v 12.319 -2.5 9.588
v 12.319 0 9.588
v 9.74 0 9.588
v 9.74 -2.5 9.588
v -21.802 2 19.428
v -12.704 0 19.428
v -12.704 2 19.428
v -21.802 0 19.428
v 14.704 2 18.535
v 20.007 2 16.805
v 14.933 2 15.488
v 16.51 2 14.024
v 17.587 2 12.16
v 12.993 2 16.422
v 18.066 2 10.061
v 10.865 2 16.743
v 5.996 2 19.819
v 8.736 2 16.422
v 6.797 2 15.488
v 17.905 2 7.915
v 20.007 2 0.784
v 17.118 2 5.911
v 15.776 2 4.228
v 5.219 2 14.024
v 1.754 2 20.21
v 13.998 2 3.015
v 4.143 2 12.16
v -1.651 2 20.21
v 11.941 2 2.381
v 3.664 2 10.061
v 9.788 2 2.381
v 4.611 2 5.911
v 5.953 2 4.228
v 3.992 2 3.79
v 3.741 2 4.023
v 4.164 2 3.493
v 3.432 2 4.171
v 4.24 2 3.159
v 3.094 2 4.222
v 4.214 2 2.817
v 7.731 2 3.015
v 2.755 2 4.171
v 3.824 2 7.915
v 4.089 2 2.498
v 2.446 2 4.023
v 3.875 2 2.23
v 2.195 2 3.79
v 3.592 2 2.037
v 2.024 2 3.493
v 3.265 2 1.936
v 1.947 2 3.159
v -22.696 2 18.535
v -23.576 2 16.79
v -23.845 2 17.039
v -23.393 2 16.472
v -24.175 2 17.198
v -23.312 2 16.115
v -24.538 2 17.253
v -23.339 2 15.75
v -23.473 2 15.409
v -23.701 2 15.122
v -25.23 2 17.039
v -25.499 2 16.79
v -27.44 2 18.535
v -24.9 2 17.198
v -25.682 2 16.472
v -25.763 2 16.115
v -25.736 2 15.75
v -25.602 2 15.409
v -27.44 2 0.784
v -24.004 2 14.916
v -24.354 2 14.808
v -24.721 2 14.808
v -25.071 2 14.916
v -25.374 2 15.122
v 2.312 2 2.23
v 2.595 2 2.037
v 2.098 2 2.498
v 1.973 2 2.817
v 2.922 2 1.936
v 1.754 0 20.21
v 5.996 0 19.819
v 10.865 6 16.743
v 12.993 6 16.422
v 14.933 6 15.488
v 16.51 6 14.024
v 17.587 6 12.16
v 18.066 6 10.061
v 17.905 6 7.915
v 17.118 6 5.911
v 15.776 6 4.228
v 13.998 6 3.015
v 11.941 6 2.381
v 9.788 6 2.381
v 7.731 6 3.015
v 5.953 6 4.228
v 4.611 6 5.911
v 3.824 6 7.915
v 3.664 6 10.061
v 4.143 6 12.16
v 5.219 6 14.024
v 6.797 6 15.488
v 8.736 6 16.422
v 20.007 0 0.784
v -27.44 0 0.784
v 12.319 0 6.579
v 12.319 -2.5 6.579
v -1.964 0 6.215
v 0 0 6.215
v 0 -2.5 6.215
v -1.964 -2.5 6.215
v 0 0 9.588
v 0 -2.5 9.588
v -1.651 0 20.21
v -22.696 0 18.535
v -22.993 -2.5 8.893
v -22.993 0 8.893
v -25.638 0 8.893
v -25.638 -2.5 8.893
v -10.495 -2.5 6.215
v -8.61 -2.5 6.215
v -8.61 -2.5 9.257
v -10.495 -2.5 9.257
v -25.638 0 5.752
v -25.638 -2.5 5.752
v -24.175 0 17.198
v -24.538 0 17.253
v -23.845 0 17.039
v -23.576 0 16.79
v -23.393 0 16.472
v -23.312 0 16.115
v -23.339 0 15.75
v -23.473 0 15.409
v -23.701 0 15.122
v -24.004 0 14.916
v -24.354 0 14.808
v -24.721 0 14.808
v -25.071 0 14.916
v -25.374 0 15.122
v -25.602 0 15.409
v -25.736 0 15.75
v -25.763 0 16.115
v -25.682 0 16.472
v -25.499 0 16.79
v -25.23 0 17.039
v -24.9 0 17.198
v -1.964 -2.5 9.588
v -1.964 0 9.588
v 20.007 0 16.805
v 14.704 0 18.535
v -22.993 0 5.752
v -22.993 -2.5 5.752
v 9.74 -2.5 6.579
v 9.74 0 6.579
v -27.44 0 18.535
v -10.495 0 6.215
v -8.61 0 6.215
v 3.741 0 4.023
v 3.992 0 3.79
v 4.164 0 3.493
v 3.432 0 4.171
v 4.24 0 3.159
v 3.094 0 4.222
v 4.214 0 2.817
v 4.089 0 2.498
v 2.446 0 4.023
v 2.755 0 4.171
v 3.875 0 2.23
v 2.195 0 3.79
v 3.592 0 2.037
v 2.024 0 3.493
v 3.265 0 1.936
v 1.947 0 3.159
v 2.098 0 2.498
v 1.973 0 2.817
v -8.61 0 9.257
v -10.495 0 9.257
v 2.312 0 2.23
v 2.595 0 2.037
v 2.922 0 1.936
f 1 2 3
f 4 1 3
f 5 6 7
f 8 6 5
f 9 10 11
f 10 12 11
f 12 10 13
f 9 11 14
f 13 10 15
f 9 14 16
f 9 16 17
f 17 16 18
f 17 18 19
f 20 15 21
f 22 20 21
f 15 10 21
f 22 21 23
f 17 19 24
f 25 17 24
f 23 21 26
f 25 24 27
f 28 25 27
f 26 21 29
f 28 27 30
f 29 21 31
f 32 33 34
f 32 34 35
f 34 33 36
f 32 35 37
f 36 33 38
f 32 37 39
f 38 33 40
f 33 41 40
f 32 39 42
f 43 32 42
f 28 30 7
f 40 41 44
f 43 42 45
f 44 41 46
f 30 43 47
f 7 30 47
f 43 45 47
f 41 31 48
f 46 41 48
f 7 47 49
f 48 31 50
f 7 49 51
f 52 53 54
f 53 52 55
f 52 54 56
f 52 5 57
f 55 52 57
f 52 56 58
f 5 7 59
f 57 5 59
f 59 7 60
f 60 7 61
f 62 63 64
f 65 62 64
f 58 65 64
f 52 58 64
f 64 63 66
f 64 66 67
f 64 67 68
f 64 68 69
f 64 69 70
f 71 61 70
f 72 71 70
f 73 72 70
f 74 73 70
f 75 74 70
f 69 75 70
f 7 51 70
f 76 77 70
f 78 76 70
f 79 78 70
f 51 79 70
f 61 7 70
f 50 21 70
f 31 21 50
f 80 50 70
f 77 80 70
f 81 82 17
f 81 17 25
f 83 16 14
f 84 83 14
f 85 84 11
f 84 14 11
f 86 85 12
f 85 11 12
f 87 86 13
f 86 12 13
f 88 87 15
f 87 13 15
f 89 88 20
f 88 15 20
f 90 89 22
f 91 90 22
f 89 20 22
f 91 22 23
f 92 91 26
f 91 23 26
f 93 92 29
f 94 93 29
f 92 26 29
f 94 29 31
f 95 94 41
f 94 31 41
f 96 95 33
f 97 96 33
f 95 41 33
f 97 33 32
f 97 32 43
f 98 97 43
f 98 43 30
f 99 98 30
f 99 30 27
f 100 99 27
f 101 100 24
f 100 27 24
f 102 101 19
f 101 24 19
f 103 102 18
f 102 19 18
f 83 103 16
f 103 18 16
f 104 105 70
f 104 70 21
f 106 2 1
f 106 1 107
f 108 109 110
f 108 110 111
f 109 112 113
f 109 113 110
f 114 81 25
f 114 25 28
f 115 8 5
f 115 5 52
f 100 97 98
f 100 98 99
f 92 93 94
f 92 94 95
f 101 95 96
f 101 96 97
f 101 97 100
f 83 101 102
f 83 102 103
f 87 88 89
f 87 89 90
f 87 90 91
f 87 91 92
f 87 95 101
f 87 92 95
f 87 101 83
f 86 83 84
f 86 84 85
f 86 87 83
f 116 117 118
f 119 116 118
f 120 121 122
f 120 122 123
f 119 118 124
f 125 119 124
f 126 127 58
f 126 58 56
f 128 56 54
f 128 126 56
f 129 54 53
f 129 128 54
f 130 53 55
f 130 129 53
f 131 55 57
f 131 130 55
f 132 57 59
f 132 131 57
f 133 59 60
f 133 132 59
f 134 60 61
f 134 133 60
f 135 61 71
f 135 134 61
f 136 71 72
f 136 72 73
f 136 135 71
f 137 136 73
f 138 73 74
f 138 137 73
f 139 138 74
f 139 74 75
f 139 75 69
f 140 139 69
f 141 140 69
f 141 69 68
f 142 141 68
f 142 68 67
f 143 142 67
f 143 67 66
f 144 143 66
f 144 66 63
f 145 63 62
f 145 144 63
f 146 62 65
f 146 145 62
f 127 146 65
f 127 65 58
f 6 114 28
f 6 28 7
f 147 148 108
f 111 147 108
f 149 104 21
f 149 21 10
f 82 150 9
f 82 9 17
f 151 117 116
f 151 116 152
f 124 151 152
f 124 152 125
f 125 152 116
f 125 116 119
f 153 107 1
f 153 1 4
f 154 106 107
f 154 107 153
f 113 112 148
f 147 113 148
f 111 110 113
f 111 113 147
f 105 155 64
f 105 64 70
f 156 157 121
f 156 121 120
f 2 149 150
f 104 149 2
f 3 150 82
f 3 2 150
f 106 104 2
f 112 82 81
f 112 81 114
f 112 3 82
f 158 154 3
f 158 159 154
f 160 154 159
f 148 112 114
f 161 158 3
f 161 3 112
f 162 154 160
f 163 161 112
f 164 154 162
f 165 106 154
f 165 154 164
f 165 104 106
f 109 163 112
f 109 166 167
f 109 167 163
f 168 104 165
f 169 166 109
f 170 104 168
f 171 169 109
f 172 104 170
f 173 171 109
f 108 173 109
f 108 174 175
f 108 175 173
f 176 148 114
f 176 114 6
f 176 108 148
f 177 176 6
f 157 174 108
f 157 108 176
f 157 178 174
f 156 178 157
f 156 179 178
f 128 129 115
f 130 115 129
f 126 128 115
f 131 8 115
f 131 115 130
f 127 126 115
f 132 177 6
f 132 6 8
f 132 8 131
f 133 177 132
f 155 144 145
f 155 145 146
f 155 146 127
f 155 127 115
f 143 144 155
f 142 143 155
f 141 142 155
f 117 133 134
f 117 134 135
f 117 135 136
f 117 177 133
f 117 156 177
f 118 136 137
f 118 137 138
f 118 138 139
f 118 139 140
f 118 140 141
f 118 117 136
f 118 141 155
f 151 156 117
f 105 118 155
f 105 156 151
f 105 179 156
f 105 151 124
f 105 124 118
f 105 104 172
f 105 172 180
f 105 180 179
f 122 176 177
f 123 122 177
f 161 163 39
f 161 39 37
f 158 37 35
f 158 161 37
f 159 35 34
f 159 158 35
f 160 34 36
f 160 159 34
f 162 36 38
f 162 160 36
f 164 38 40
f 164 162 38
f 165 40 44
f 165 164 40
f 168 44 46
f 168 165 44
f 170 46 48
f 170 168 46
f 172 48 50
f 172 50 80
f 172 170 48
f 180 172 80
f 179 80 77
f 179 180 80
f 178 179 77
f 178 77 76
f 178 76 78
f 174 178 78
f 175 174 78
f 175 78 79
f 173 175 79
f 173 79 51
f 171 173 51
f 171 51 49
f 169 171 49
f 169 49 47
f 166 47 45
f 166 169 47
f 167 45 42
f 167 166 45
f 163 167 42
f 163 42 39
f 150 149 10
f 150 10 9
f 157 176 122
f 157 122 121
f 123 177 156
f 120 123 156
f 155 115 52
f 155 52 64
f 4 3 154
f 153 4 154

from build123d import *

# Parameters (mm, degrees)
SKETCH_1_R      = 1.229324964
SKETCH_1_R_2    = 1.149420027
EXTRUDE_1_DEPTH = 2
SKETCH_2_R      = 7.221294113
EXTRUDE_2_DEPTH = 4
SKETCH_3_W      = 2.645095026
SKETCH_3_H      = 3.141050342
SKETCH_3_W_2    = 1.884630206
SKETCH_3_H_2    = 3.041859279
SKETCH_3_W_3    = 1.96408086
SKETCH_3_H_3    = 3.372496157
SKETCH_3_W_4    = 2.57896765
SKETCH_3_H_4    = 3.008795591
EXTRUDE_3_DEPTH = 2.5


with BuildPart() as part:
    # 草图1 → 凸台-拉伸1 (new body)
    with BuildSketch(Plane(origin=(0, 0, 0), x_dir=(1, 0, 0), z_dir=(0, 1, 0))):
        Polygon((-27.440284042, -0.784220791), (20.007371412, -0.784220791), (20.007371412, -16.804782103), (14.704398156, -18.535226008), (5.996357861, -19.819103743), (1.753979255, -20.209849141), (-1.651087783, -20.209849141), (-12.703600465, -19.428358346), (-21.802386158, -19.428358346), (-22.695518496, -18.535226008), (-27.440284042, -18.535226008), align=None)
        with Locations(Location((-24.537603943, -16.023291307, 0), (0, 0, 270))):
            Circle(SKETCH_1_R, mode=Mode.SUBTRACT)
        with Locations(Location((3.093677762, -3.072872407, 0), (0, 0, 270))):
            Circle(SKETCH_1_R_2, mode=Mode.SUBTRACT)
    extrude(amount=EXTRUDE_1_DEPTH)

    # 草图2 → 凸台-拉伸2 (add)
    with BuildSketch(Plane(origin=(0, 2, 0), x_dir=(1, 0, 0), z_dir=(0, 1, 0))):
        with Locations(Location((10.864630012, -9.521656176, 0), (0, 0, 270))):
            Circle(SKETCH_2_R)
    extrude(amount=EXTRUDE_2_DEPTH)

    # 草图3 → 凸台-拉伸3 (add)
    with BuildSketch(Plane(origin=(0, 0, 0), x_dir=(-1, 0, 0), z_dir=(0, -1, 0))):
        with Locations((24.315133823, -7.322920936)):
            Rectangle(SKETCH_3_W, SKETCH_3_H)
        with Locations((9.552197214, -7.736217034)):
            Rectangle(SKETCH_3_W_2, SKETCH_3_H_2)
        with Locations((0.98204043, -7.901535473)):
            Rectangle(SKETCH_3_W_3, SKETCH_3_H_3)
        with Locations((-11.029948451, -8.083385756)):
            Rectangle(SKETCH_3_W_4, SKETCH_3_H_4)
    extrude(amount=EXTRUDE_3_DEPTH)


solid = part.part
